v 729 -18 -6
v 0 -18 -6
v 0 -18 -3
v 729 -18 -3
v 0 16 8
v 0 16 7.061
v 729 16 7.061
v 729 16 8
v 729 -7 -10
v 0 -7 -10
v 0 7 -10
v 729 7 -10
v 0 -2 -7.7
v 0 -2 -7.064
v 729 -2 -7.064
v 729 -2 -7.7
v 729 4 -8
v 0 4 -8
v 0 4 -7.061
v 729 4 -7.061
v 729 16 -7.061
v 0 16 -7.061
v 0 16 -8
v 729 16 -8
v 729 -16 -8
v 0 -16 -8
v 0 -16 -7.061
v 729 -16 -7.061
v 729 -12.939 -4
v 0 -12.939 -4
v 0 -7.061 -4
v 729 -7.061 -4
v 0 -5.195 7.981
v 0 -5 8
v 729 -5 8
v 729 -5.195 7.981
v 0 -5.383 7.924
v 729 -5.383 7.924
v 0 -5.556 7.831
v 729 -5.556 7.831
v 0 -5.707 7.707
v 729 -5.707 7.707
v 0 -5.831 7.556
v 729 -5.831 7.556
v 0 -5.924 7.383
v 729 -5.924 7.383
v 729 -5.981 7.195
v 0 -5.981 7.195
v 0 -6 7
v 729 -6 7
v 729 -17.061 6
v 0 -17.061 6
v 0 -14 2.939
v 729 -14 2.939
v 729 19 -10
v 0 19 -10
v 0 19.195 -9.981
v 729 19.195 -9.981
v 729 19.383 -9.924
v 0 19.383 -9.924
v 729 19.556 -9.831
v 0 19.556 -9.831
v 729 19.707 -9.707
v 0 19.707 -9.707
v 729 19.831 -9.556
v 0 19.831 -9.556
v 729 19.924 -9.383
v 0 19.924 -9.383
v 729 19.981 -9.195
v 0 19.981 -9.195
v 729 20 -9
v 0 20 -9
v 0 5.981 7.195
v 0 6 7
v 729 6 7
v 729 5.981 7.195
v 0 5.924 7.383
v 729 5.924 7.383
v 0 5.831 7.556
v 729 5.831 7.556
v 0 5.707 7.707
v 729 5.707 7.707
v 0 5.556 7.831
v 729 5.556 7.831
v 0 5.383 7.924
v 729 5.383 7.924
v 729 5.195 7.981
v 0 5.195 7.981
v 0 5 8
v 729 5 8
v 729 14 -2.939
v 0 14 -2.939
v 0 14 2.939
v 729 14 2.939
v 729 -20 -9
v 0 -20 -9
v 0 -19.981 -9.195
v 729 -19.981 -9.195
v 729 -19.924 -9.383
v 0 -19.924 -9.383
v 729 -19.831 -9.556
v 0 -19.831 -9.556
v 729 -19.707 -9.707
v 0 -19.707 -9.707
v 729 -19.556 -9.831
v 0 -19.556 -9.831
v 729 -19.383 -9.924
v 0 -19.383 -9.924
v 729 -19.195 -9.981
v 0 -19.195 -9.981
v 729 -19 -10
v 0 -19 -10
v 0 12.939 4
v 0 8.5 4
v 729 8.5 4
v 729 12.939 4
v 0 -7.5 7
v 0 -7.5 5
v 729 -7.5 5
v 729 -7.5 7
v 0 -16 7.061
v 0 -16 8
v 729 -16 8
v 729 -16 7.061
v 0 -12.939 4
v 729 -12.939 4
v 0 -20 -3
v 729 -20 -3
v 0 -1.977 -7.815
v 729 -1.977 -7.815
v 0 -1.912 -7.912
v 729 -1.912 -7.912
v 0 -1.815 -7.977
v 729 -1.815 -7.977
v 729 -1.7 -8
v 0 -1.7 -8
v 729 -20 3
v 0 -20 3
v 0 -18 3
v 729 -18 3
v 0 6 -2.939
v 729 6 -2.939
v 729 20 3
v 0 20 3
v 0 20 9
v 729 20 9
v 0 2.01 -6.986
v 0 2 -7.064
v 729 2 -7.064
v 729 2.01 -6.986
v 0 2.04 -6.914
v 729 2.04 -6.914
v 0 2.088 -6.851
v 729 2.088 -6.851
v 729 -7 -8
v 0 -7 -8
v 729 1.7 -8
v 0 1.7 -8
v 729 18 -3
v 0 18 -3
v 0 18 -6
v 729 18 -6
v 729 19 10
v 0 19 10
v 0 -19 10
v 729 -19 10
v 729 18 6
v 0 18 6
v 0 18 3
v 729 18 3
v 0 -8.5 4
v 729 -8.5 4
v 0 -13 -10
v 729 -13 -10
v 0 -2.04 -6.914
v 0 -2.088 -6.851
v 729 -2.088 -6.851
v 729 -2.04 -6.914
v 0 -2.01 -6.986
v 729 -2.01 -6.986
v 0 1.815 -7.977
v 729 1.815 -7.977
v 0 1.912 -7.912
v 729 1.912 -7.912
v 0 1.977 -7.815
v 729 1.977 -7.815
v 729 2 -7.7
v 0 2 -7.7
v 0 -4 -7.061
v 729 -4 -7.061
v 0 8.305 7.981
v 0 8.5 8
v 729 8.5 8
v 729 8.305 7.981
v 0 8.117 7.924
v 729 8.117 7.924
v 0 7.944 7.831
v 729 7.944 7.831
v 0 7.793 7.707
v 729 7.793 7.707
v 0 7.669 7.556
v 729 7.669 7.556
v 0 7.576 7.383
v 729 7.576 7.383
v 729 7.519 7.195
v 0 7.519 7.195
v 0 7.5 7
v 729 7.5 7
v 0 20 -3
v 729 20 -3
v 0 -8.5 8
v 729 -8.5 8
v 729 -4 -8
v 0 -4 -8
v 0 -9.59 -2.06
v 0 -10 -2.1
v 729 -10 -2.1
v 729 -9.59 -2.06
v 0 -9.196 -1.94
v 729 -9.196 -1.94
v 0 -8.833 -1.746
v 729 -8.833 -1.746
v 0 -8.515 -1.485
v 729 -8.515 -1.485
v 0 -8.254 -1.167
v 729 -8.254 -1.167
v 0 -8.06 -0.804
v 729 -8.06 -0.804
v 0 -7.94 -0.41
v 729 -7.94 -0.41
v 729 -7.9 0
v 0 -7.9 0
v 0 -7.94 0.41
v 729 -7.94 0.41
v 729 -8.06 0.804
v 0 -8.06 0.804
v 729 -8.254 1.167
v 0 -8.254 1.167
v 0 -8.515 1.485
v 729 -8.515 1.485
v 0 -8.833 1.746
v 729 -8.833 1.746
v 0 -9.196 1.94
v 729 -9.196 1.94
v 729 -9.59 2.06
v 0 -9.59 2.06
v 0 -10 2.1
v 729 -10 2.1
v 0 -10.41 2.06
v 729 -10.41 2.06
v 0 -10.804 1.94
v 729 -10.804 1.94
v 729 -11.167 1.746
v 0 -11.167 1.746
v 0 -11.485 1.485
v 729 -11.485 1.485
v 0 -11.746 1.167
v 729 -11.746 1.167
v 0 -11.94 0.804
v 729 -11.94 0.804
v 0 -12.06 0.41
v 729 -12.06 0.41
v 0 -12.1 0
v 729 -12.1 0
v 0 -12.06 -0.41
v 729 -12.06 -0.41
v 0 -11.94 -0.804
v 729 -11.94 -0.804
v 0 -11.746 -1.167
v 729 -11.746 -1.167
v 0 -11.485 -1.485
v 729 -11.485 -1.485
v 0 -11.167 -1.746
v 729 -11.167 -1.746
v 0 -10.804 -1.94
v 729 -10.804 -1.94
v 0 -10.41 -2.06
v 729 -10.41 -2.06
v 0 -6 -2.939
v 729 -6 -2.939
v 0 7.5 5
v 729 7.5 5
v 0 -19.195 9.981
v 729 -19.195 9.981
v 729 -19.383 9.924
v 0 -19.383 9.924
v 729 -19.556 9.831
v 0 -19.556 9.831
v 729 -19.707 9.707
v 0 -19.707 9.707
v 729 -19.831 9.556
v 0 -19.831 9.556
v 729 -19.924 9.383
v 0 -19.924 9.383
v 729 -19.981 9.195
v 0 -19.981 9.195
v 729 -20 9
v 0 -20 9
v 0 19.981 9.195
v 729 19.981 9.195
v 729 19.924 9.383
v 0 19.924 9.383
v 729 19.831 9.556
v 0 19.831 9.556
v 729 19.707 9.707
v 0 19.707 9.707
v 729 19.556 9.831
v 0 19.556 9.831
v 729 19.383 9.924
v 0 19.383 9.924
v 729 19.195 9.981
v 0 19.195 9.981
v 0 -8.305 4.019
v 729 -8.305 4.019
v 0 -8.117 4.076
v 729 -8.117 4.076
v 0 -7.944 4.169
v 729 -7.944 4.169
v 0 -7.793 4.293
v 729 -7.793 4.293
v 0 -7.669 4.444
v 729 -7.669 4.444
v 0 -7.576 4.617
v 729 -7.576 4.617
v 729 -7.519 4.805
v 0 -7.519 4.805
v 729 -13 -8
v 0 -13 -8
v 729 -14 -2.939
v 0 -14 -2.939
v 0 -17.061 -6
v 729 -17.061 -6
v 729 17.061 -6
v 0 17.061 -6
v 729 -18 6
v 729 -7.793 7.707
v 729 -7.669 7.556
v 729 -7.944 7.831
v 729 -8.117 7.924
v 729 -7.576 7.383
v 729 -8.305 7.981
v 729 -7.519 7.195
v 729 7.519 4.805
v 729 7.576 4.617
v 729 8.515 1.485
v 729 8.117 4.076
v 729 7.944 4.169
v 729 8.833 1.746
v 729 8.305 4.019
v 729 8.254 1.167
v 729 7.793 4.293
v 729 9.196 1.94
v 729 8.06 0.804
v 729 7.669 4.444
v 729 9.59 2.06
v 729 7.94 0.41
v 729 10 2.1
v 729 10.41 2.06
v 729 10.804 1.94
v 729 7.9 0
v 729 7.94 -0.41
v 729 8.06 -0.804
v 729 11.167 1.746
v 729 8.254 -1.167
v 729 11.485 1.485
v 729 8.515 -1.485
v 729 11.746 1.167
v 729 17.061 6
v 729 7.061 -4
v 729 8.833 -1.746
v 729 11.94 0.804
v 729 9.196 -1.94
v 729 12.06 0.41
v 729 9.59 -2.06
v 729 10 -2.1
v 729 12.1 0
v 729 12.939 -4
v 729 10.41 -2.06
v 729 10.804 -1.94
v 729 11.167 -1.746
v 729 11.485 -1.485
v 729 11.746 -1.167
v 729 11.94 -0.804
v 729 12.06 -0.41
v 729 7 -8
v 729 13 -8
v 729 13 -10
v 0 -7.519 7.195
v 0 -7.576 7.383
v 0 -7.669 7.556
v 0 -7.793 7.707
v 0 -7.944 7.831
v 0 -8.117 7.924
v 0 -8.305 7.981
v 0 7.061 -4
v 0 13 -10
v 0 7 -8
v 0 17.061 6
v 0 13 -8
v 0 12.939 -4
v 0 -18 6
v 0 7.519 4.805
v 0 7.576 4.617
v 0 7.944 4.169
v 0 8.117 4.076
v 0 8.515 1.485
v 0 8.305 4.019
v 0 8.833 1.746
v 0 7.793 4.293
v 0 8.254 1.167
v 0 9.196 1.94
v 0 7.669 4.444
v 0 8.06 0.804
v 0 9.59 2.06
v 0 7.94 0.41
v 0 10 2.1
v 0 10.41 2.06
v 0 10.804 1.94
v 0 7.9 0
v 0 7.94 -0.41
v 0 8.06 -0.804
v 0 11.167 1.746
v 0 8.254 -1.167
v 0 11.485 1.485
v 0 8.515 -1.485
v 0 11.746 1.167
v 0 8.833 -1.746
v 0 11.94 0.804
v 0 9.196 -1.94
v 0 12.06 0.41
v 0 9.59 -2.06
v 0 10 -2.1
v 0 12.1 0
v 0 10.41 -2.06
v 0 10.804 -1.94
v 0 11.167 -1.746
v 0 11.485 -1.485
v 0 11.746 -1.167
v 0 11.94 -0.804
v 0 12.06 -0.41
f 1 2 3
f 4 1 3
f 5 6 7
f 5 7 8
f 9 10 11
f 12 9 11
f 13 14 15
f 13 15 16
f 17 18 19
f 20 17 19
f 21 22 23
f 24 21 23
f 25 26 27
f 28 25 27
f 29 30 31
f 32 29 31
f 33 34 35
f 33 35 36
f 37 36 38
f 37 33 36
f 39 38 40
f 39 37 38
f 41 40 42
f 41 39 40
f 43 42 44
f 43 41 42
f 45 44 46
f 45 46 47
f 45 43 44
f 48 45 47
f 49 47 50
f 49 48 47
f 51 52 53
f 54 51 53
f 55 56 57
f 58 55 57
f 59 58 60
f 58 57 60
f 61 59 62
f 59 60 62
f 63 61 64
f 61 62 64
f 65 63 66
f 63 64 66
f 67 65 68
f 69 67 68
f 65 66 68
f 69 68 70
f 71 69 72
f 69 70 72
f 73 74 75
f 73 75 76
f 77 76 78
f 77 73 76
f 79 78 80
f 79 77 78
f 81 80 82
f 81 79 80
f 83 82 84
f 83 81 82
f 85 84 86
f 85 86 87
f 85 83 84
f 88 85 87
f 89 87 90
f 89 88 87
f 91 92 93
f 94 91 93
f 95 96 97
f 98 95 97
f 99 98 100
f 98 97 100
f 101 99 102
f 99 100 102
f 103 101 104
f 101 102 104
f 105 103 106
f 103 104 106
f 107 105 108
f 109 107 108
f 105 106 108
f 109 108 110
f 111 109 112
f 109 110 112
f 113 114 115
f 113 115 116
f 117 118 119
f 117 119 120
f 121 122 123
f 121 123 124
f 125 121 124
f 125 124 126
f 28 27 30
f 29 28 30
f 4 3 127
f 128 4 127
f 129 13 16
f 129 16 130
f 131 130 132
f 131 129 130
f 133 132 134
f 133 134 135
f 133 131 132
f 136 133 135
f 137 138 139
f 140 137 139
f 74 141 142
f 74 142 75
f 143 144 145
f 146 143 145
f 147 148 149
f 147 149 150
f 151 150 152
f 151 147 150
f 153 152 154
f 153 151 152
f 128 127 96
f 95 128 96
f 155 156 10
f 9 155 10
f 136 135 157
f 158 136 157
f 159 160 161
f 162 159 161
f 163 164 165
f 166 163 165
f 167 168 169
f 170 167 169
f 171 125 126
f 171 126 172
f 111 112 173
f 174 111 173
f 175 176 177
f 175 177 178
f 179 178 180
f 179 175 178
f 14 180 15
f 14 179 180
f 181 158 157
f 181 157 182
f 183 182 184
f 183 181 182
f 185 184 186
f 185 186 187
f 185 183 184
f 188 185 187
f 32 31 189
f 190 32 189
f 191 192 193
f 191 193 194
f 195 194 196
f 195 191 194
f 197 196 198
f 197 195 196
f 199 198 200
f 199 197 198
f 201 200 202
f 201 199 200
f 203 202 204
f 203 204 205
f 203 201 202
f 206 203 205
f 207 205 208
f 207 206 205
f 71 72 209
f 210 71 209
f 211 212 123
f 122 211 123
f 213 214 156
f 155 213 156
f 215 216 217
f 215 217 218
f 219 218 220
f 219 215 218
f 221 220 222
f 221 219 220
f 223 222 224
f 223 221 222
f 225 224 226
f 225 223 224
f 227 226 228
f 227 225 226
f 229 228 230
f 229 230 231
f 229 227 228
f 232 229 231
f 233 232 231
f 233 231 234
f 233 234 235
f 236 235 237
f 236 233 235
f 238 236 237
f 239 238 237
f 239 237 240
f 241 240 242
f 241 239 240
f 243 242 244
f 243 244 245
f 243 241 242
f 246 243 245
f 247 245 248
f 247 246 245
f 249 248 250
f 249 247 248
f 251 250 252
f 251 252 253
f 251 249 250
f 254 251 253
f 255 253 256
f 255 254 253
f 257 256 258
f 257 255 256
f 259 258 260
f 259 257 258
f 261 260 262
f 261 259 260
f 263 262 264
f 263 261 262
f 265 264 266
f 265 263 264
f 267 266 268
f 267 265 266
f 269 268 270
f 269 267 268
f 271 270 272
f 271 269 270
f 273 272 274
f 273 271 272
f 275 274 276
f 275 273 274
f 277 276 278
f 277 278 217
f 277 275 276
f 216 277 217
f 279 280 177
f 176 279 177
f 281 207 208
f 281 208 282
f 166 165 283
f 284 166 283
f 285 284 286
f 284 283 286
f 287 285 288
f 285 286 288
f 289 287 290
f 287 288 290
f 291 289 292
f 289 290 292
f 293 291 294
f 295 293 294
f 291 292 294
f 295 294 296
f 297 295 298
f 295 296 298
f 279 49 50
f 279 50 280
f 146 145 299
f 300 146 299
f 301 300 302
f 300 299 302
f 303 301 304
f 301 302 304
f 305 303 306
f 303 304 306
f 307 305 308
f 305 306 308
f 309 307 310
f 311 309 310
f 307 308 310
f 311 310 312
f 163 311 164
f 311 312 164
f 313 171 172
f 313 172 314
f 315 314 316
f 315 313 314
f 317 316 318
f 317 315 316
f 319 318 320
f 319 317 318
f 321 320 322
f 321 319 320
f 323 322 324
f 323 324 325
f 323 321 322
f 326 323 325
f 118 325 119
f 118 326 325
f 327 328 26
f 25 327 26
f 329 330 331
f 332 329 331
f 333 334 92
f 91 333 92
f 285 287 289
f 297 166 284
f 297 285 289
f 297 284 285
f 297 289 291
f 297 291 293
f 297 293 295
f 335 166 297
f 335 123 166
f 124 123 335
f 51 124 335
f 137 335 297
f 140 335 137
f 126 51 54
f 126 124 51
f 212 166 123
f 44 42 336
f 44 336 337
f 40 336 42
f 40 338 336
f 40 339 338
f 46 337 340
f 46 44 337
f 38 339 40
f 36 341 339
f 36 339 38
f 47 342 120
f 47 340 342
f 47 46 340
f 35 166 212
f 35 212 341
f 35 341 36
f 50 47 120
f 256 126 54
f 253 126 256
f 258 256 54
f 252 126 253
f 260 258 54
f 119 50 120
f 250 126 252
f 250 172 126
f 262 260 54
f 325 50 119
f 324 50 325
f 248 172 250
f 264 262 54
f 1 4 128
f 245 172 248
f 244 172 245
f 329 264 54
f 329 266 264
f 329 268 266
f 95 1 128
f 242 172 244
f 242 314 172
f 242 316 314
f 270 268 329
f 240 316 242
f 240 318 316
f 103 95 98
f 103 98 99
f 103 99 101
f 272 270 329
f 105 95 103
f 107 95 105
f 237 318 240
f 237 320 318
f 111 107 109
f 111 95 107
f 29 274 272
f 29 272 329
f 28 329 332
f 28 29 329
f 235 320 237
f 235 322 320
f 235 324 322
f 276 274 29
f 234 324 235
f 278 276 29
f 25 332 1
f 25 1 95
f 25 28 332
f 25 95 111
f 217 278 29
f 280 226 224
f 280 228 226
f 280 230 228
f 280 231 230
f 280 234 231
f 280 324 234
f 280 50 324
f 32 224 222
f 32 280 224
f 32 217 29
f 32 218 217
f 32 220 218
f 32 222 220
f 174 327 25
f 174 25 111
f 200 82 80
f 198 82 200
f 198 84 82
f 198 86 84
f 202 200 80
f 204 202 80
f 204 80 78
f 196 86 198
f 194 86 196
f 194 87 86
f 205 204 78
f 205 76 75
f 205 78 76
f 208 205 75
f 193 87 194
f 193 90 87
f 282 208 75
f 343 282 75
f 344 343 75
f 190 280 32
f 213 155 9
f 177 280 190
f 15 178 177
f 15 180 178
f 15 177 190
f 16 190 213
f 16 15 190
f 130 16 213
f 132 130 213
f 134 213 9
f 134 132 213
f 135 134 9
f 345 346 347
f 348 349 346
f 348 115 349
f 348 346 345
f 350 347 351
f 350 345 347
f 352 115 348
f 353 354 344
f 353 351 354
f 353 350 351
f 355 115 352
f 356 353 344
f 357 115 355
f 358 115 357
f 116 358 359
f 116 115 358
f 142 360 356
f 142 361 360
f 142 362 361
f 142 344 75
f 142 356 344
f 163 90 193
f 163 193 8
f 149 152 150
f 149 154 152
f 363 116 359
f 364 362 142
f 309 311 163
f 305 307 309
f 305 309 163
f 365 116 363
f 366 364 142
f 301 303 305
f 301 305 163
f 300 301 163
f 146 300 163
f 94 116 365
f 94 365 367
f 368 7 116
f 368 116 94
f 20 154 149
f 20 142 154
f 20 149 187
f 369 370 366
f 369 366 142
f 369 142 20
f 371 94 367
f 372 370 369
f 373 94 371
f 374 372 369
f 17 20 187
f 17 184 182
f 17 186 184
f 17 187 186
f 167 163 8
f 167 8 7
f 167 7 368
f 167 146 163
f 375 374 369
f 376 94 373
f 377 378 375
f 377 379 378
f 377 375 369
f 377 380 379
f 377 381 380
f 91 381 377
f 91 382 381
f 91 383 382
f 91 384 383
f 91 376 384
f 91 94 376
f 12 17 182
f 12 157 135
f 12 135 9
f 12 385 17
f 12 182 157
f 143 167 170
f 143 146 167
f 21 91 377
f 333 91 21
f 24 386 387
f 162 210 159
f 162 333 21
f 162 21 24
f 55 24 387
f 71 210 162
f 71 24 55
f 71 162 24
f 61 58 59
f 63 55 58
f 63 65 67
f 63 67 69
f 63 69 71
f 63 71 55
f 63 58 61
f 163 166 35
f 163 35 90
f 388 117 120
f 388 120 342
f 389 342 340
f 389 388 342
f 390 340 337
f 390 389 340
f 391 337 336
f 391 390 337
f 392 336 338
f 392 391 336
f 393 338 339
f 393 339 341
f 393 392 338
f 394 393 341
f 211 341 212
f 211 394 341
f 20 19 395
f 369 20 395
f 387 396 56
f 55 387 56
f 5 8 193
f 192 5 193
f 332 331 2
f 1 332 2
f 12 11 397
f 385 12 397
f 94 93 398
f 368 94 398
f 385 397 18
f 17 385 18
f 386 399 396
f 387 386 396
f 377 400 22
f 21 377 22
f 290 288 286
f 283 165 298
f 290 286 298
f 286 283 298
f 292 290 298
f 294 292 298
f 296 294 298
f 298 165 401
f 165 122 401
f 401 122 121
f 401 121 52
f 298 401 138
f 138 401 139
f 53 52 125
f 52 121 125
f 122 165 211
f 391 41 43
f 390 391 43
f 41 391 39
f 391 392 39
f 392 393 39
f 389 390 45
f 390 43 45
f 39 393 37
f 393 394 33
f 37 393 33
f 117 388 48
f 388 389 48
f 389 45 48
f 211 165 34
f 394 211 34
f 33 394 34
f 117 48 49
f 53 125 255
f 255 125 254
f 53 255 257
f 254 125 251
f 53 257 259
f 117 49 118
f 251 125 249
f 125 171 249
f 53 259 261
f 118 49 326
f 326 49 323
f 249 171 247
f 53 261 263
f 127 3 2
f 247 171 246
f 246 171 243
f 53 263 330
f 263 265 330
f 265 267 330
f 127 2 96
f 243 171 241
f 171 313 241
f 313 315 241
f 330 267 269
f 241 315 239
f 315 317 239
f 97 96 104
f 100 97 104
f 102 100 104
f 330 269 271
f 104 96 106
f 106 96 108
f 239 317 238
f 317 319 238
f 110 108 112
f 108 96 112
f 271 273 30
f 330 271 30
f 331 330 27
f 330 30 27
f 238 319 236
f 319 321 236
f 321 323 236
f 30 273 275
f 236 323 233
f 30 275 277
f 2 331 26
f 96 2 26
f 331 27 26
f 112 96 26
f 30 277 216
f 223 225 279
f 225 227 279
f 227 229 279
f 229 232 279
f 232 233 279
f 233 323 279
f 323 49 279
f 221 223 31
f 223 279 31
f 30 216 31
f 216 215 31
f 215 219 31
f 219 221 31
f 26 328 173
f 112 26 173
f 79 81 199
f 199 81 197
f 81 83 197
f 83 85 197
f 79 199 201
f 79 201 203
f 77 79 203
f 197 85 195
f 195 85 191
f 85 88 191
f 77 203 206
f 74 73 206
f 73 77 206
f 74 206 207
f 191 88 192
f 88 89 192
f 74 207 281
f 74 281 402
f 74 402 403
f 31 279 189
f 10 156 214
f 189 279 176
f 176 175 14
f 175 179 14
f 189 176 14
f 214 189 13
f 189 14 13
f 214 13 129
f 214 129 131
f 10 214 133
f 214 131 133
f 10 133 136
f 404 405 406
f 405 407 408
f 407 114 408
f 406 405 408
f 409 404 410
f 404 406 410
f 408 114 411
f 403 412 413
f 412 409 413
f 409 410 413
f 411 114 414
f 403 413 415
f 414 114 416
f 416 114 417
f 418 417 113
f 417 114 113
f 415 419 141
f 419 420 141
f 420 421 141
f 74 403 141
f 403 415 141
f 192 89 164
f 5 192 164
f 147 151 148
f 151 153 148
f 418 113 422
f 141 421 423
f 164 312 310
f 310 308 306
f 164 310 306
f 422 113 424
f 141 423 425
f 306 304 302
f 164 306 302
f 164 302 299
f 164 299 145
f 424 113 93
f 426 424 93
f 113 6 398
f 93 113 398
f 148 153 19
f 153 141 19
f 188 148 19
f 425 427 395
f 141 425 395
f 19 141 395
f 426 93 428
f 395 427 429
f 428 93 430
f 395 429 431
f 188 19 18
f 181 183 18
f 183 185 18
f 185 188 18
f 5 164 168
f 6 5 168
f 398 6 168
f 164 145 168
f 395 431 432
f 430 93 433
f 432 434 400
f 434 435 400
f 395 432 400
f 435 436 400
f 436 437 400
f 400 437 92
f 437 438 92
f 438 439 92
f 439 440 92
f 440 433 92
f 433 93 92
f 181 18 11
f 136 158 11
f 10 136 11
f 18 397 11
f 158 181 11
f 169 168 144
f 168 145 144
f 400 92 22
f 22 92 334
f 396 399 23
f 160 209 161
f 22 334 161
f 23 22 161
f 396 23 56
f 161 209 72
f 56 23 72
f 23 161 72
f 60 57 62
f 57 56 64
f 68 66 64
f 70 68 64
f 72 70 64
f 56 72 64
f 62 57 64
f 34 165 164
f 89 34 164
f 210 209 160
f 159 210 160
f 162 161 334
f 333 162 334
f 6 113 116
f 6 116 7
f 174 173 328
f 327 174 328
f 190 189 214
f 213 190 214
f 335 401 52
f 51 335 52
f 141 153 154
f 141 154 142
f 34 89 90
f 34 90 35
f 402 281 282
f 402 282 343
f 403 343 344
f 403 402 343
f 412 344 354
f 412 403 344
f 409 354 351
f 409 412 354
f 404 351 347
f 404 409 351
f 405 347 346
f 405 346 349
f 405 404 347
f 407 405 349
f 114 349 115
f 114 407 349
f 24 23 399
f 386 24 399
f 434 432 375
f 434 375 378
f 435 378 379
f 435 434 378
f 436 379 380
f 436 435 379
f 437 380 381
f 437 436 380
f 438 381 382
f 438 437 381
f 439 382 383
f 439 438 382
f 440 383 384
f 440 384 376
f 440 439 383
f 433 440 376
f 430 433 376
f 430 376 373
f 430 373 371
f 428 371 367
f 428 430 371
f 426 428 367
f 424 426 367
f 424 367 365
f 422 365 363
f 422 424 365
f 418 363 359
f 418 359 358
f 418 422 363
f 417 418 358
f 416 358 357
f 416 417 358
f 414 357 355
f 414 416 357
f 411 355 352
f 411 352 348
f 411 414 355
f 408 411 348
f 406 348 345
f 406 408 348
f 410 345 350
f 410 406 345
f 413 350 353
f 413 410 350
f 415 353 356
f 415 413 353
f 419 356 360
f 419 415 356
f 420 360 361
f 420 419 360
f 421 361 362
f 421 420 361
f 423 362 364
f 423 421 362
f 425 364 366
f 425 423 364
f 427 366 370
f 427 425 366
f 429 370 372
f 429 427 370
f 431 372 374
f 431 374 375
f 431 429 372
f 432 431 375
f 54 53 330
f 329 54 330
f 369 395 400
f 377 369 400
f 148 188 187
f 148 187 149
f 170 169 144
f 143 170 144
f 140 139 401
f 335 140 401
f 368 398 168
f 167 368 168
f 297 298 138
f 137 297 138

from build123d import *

# Parameters (mm, degrees)
SKETCH1_R           = 2.1
BOSS_EXTRUDE1_DEPTH = 729


with BuildPart() as part:
    # Sketch1 → Boss-Extrude1 (new body)
    with BuildSketch(Plane(origin=(0, 0, 0), x_dir=(0, 0, -1), z_dir=(1, 0, 0))):
        with BuildLine():
            Line((10, 13), (10, 19))
            ThreePointArc((10, 19), (9.707106781, 19.707106781), (9, 20))
            Line((9, 20), (3, 20))
            Line((3, 20), (3, 18))
            Line((3, 18), (6, 18))
            Line((6, 18), (6, 17.060660172))
            Line((6, 17.060660172), (2.939339828, 14))
            Line((2.939339828, 14), (-2.939339828, 14))
            Line((-2.939339828, 14), (-6, 17.060660172))
            Line((-6, 17.060660172), (-6, 18))
            Line((-6, 18), (-3, 18))
            Line((-3, 18), (-3, 20))
            Line((-3, 20), (-9, 20))
            ThreePointArc((-9, 20), (-9.707106781, 19.707106781), (-10, 19))
            Line((-10, 19), (-10, -19))
            ThreePointArc((-10, -19), (-9.707106781, -19.707106781), (-9, -20))
            Line((-9, -20), (-3, -20))
            Line((-3, -20), (-3, -18))
            Line((-3, -18), (-6, -18))
            Line((-6, -18), (-6, -17.060660172))
            Line((-6, -17.060660172), (-2.939339828, -14))
            Line((-2.939339828, -14), (2.939339828, -14))
            Line((2.939339828, -14), (6, -17.060660172))
            Line((6, -17.060660172), (6, -18))
            Line((6, -18), (3, -18))
            Line((3, -18), (3, -20))
            Line((3, -20), (9, -20))
            ThreePointArc((9, -20), (9.707106781, -19.707106781), (10, -19))
            Line((10, -19), (10, -13))
            Line((10, -13), (8, -13))
            Line((8, -13), (8, -16))
            Line((8, -16), (7.060660172, -16))
            Line((7.060660172, -16), (4, -12.939339828))
            Line((4, -12.939339828), (4, -7.060660172))
            Line((4, -7.060660172), (7.060660172, -4))
            Line((7.060660172, -4), (8, -4))
            Line((8, -4), (8, -7))
            Line((8, -7), (10, -7))
            Line((10, -7), (10, 7))
            Line((10, 7), (8, 7))
            Line((8, 7), (8, 4))
            Line((8, 4), (7.060660172, 4))
            Line((7.060660172, 4), (4, 7.060660172))
            Line((4, 7.060660172), (4, 12.939339828))
            Line((4, 12.939339828), (7.060660172, 16))
            Line((7.060660172, 16), (8, 16))
            Line((8, 16), (8, 13))
            Line((8, 13), (10, 13))
        make_face()
        with Locations((0, -10)):
            Circle(SKETCH1_R, mode=Mode.SUBTRACT)
        with Locations((0, 10)):
            Circle(SKETCH1_R, mode=Mode.SUBTRACT)
        with BuildLine():
            Line((8, -1.7), (8, 1.7))
            ThreePointArc((8, 1.7), (7.912132034, 1.912132034), (7.7, 2))
            Line((7.7, 2), (7.063603897, 2))
            ThreePointArc((7.063603897, 2), (6.948798867, 2.02283614), (6.851471863, 2.087867966))
            Line((6.851471863, 2.087867966), (2.939339828, 6))
            Line((2.939339828, 6), (-7, 6))
            ThreePointArc((-7, 6), (-7.707106781, 5.707106781), (-8, 5))
            Line((-8, 5), (-8, -5))
            ThreePointArc((-8, -5), (-7.707106781, -5.707106781), (-7, -6))
            Line((-7, -6), (2.939339828, -6))
            Line((2.939339828, -6), (6.851471863, -2.087867966))
            ThreePointArc((6.851471863, -2.087867966), (6.948798867, -2.02283614), (7.063603897, -2))
            Line((7.063603897, -2), (7.7, -2))
            ThreePointArc((7.7, -2), (7.912132034, -1.912132034), (8, -1.7))
        make_face(mode=Mode.SUBTRACT)
        with BuildLine():
            Line((-7.060660172, -16), (-4, -12.939339828))
            Line((-4, -12.939339828), (-4, -8.5))
            ThreePointArc((-4, -8.5), (-4.292893219, -7.792893219), (-5, -7.5))
            Line((-5, -7.5), (-7, -7.5))
            ThreePointArc((-7, -7.5), (-7.707106781, -7.792893219), (-8, -8.5))
            Line((-8, -8.5), (-8, -16))
            Line((-8, -16), (-7.060660172, -16))
        make_face(mode=Mode.SUBTRACT)
        with BuildLine():
            Line((-4, 8.5), (-4, 12.939339828))
            Line((-4, 12.939339828), (-7.060660172, 16))
            Line((-7.060660172, 16), (-8, 16))
            Line((-8, 16), (-8, 8.5))
            ThreePointArc((-8, 8.5), (-7.707106781, 7.792893219), (-7, 7.5))
            Line((-7, 7.5), (-5, 7.5))
            ThreePointArc((-5, 7.5), (-4.292893219, 7.792893219), (-4, 8.5))
        make_face(mode=Mode.SUBTRACT)
    extrude(amount=BOSS_EXTRUDE1_DEPTH)


solid = part.part
